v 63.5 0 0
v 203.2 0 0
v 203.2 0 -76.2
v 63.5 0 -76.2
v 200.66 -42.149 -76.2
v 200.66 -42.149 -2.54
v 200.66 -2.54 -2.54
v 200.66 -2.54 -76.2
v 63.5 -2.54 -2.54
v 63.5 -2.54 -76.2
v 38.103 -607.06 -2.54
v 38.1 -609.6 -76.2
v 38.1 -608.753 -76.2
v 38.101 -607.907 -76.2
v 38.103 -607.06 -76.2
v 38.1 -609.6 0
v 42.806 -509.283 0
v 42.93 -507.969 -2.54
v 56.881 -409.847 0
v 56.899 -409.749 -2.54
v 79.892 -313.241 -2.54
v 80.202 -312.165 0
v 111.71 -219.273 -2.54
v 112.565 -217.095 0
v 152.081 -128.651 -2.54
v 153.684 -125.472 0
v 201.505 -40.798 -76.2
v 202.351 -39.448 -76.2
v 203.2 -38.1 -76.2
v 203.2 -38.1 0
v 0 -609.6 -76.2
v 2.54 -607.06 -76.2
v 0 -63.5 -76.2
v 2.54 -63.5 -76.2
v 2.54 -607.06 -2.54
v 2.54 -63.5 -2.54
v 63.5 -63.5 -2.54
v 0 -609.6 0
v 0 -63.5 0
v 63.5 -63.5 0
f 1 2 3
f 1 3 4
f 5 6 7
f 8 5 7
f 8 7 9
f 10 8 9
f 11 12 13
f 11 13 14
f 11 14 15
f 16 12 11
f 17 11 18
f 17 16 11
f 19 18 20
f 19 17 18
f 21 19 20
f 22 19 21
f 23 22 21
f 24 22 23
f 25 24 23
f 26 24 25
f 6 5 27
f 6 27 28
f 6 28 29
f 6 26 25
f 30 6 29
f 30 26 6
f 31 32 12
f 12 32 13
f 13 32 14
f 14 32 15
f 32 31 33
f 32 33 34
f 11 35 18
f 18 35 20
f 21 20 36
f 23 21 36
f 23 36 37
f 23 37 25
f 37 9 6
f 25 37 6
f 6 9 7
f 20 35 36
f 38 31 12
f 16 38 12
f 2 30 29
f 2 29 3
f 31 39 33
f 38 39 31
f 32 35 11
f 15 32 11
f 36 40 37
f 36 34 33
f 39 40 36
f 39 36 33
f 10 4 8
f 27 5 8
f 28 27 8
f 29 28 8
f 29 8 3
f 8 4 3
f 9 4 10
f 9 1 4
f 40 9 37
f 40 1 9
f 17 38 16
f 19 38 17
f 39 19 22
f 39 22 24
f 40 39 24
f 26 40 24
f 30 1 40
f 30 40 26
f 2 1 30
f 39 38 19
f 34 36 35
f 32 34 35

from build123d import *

# Parameters (mm, degrees)
F1_DEPTH = 76.2
F2_T     = -2.54


with BuildPart() as f1:
    # F0 (on Top) → F1 (new body)
    with BuildSketch(Plane.XY):
        with BuildLine():
            Line((203.2, 0), (63.5, 0))
            Line((63.5, 0), (63.5, -63.5))
            Line((63.5, -63.5), (0, -63.5))
            Line((0, -63.5), (0, -609.6))
            Line((0, -609.6), (38.1, -609.6))
            ThreePointArc((38.1, -609.6), (80.202006, -312.165024), (203.2, -38.1))
            Line((203.2, -38.1), (203.2, 0))
        make_face()
    extrude(amount=-F1_DEPTH)

    # F2
    f2_openings = [f1.faces().sort_by_distance(p)[0] for p in [
        (66.483993, -223.719229, -76.2),
        (80.202006, -312.165024, -38.1),
        (31.75, -63.5, -38.1),
        (63.5, -31.75, -38.1),
    ]]
    offset(amount=F2_T, openings=f2_openings)


solid = f1.part
